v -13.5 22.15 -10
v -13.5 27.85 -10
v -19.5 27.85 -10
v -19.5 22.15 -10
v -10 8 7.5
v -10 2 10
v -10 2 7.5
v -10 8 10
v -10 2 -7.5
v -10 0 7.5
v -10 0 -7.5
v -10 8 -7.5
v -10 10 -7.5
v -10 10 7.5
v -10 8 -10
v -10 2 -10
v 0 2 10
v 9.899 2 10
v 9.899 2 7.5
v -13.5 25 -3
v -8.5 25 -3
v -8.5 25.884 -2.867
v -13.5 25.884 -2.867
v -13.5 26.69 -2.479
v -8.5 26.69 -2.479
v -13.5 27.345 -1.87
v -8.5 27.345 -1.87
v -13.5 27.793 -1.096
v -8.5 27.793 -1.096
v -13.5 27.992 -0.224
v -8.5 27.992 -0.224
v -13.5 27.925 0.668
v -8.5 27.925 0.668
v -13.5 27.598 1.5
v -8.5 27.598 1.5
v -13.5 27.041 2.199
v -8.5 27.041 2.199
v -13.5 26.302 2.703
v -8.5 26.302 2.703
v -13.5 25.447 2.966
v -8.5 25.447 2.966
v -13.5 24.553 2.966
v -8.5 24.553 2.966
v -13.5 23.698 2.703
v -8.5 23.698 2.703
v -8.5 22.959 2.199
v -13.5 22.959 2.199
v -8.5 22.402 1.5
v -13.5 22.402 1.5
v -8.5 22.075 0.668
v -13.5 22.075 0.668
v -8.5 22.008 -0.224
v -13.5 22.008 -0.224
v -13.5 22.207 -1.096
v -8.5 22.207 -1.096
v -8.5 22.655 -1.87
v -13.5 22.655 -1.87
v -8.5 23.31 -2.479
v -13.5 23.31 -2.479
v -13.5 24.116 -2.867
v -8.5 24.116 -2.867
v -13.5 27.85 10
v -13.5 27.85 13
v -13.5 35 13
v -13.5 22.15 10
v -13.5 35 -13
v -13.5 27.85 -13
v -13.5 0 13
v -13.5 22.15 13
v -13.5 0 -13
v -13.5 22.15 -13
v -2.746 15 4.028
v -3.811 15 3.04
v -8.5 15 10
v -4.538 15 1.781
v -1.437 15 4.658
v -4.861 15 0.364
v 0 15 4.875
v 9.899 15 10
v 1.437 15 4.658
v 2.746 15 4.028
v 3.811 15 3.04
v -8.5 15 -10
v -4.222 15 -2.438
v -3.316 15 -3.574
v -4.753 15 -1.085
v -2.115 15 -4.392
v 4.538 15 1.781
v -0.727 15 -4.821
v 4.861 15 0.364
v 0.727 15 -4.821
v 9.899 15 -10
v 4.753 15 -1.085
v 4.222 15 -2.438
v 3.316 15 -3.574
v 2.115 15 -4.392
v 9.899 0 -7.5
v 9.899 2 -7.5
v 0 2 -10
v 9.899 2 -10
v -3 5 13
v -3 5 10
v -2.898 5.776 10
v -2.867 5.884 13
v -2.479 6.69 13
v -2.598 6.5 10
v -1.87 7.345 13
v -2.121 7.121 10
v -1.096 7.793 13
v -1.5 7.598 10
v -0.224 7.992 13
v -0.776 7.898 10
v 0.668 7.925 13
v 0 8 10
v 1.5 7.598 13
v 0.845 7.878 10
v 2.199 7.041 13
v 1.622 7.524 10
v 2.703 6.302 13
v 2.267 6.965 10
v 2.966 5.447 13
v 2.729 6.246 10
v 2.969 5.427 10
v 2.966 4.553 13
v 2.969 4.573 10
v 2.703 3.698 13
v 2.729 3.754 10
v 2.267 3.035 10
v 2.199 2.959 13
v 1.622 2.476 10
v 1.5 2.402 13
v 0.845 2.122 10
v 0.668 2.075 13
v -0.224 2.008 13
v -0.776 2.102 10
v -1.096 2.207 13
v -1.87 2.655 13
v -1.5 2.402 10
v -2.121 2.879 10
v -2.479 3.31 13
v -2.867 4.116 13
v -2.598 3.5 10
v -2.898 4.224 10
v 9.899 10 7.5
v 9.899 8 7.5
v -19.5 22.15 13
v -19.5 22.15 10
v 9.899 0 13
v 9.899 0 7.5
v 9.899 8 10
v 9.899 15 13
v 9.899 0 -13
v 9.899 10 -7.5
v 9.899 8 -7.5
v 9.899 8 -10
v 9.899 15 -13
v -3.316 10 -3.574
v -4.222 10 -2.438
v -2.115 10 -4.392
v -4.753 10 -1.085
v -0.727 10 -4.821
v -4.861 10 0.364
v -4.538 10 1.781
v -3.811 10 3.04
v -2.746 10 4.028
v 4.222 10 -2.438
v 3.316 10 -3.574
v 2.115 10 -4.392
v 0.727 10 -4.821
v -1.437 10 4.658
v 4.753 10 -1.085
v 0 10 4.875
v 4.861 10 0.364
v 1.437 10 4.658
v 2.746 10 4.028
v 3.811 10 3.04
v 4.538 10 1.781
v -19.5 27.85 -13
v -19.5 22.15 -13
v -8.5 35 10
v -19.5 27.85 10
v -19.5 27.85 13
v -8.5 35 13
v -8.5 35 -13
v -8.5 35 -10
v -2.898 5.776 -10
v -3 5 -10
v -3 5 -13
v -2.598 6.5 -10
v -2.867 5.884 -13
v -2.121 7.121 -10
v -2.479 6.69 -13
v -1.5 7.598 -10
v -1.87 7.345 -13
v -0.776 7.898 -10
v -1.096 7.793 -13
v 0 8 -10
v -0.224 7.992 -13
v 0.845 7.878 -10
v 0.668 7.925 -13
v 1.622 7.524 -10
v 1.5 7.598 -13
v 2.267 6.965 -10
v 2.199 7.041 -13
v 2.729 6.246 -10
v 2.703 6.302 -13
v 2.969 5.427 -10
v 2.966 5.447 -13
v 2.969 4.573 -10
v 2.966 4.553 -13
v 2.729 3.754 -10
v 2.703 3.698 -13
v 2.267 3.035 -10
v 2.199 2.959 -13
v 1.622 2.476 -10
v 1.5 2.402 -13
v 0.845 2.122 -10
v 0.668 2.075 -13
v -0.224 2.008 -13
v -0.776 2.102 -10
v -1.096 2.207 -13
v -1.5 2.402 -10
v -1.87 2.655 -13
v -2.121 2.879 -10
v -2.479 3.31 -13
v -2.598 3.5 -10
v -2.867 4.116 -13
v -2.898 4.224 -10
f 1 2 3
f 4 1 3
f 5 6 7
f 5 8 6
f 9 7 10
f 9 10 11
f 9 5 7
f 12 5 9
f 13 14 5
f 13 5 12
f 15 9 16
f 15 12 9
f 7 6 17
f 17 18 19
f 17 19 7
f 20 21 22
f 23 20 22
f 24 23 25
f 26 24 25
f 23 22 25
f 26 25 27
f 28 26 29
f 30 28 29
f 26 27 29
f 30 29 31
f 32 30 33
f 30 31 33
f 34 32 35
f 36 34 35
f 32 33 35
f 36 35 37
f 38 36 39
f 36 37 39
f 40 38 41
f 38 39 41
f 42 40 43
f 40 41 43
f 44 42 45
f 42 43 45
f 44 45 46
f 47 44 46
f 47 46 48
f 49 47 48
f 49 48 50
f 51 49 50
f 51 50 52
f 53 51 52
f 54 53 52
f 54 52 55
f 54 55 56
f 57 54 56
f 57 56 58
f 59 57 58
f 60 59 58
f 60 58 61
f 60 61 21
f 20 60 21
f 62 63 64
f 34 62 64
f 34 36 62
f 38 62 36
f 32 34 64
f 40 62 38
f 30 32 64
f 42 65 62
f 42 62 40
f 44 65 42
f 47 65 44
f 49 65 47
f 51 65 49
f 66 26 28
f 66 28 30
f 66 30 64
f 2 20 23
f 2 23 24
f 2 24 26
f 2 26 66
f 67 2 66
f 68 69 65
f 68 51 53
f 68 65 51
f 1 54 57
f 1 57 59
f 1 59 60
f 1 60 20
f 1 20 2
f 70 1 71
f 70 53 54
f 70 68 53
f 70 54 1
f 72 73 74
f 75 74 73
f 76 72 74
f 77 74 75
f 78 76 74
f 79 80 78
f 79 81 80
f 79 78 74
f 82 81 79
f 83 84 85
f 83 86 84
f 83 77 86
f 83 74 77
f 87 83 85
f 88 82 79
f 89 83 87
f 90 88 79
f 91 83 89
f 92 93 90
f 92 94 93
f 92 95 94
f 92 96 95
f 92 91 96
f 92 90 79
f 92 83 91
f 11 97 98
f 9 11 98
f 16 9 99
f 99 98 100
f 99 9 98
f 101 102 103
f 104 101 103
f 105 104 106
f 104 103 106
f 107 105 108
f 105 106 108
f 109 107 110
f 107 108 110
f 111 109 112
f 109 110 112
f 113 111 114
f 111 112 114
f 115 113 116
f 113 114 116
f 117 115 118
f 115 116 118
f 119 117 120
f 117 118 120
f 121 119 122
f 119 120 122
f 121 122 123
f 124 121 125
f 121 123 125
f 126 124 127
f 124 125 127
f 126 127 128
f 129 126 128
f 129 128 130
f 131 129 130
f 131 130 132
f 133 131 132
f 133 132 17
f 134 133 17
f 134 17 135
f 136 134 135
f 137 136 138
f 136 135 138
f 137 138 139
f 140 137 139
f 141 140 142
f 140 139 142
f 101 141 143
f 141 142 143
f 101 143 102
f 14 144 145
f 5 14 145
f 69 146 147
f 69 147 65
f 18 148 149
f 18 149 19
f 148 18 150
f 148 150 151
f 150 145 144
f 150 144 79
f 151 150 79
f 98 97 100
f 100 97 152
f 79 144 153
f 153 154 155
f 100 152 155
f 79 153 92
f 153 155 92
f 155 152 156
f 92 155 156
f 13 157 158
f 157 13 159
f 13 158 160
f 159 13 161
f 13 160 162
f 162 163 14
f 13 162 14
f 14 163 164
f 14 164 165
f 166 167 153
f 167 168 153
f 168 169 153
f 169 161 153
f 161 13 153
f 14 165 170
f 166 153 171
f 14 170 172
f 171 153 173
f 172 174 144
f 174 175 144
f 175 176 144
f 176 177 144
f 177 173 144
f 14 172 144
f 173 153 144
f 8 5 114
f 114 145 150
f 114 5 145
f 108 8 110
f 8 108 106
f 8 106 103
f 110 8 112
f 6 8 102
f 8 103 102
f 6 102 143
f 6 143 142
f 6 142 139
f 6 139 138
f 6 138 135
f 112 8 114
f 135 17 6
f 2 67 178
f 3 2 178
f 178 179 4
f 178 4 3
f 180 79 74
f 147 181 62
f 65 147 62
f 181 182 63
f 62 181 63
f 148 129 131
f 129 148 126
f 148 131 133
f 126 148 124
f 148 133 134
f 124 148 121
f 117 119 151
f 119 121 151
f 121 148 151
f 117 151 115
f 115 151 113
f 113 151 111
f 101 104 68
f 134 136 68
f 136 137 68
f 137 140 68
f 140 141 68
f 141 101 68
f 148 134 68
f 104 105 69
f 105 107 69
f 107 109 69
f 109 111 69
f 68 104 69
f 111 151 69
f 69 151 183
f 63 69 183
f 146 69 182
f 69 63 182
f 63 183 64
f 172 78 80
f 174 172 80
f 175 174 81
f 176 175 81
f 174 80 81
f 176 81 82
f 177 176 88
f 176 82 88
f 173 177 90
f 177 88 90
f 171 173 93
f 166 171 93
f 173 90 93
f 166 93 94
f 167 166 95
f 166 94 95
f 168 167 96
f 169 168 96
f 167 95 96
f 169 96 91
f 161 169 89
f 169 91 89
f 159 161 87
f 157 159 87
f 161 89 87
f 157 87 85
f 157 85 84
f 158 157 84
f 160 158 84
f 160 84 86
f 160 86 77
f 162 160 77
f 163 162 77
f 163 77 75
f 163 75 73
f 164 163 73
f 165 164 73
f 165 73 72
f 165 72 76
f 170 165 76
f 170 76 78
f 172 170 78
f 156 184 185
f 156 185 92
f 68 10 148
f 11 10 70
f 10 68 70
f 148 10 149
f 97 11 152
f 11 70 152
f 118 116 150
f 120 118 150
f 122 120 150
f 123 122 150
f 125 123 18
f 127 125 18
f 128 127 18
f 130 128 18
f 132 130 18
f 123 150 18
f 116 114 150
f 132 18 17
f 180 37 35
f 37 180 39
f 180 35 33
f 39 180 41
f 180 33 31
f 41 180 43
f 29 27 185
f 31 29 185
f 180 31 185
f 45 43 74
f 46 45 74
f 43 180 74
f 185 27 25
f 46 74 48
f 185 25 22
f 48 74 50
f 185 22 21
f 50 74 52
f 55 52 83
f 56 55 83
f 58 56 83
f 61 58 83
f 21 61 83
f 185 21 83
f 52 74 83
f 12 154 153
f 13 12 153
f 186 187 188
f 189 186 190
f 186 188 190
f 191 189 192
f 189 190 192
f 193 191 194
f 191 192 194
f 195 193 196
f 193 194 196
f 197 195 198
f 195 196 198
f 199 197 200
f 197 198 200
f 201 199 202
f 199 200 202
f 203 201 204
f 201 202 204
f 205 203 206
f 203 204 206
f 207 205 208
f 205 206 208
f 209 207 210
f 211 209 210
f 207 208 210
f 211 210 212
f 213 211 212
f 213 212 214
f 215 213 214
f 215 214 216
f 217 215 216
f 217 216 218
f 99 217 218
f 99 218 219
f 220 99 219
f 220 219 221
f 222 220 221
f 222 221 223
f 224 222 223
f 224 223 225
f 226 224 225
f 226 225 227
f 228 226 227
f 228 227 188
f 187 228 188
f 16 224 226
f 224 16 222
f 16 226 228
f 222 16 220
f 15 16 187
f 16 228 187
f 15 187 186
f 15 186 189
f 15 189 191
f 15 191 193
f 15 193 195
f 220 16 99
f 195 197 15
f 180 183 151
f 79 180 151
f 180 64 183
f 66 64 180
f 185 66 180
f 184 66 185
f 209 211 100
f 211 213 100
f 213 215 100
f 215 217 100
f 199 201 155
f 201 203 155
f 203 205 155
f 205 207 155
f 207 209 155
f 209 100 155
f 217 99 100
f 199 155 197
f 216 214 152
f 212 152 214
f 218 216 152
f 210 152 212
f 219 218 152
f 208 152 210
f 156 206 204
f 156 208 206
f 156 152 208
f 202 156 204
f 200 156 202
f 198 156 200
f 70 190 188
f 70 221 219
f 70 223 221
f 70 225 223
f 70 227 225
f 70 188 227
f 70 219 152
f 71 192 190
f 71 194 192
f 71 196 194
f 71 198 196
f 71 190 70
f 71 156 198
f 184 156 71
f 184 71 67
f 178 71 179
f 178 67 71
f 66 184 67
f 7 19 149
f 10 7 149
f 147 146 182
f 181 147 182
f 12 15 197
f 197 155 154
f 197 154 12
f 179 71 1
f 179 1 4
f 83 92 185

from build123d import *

# Parameters (mm, degrees)
SKETCH1_W           = 27
SKETCH1_H           = 26
BOSS_EXTRUDE1_DEPTH = 15
CUT_EXTRUDE2_DEPTH  = 23.5
SKETCH5_W           = 3.601284645
SKETCH5_H           = 15
CUT_EXTRUDE3_DEPTH  = 33.912763482
SKETCH6_R           = 3
CUT_EXTRUDE4_DEPTH  = 33.912763482
SKETCH7_W           = 5
SKETCH7_H           = 26
BOSS_EXTRUDE2_DEPTH = 20
SKETCH8_W           = 6
SKETCH8_H           = 5.7
BOSS_EXTRUDE3_DEPTH = 3
SKETCH9_W           = 6
SKETCH9_H           = 5.7
BOSS_EXTRUDE4_DEPTH = 3
SKETCH10_R          = 3
CUT_EXTRUDE5_DEPTH  = 42.623463656
SKETCH11_R          = 4.875
CUT_EXTRUDE6_DEPTH  = 31.809901006


with BuildPart() as part:
    # Sketch1 → Boss-Extrude1 (new body)
    with BuildSketch(Plane(origin=(0, 0, 0), x_dir=(1, 0, 0), z_dir=(0, 1, 0))):
        Rectangle(SKETCH1_W, SKETCH1_H)
    extrude(amount=BOSS_EXTRUDE1_DEPTH)

    # Sketch4 → Cut-Extrude2 (cut)
    with BuildSketch(Plane(origin=(13.5, 0, 0), x_dir=(0, 0, -1), z_dir=(1, 0, 0))):
        Polygon((-10, 2), (-7.5, 2), (-7.5, 0), (7.5, 0), (7.5, 2), (10, 2), (10, 8), (7.5, 8), (7.5, 10), (-7.5, 10), (-7.5, 8), (-10, 8), align=None)
    extrude(amount=-CUT_EXTRUDE2_DEPTH, mode=Mode.SUBTRACT)

    # Sketch5 → Cut-Extrude3 (cut, through all)
    with BuildSketch(Plane(origin=(0, 0, -13), x_dir=(-1, 0, 0), z_dir=(0, 0, -1))):
        with Locations((-11.699357678, 7.5)):
            Rectangle(SKETCH5_W, SKETCH5_H)
    extrude(amount=-CUT_EXTRUDE3_DEPTH, mode=Mode.SUBTRACT)

    # Sketch6 → Cut-Extrude4 (cut, through all)
    with BuildSketch(Plane(origin=(0, 0, -13), x_dir=(-1, 0, 0), z_dir=(0, 0, -1))):
        with Locations((0, 5)):
            Circle(SKETCH6_R)
    extrude(amount=-CUT_EXTRUDE4_DEPTH, mode=Mode.SUBTRACT)

    # Sketch7 → Boss-Extrude2 (add)
    with BuildSketch(Plane(origin=(0, 15, 0), x_dir=(1, 0, 0), z_dir=(0, 1, 0))):
        with Locations((-11, 0)):
            Rectangle(SKETCH7_W, SKETCH7_H)
    extrude(amount=BOSS_EXTRUDE2_DEPTH)

    # Sketch8 → Boss-Extrude3 (add)
    with BuildSketch(Plane(origin=(0, 0, -13), x_dir=(-1, 0, 0), z_dir=(0, 0, -1))):
        Polygon((8.5, 35), (-9.898715355, 15), (8.5, 15), align=None)
        with Locations((16.5, 25)):
            Rectangle(SKETCH8_W, SKETCH8_H)
    extrude(amount=-BOSS_EXTRUDE3_DEPTH)

    # Sketch9 → Boss-Extrude4 (add)
    with BuildSketch(Plane.XY.offset(13)):
        Polygon((-8.5, 35), (9.898715355, 15), (-8.5, 15), align=None)
        with Locations((-16.5, 25)):
            Rectangle(SKETCH9_W, SKETCH9_H)
    extrude(amount=-BOSS_EXTRUDE4_DEPTH)

    # Sketch10 → Cut-Extrude5 (cut, through all)
    with BuildSketch(Plane(origin=(-8.5, 0, 0), x_dir=(0, 0, -1), z_dir=(1, 0, 0))):
        with Locations((0, 25)):
            Circle(SKETCH10_R)
    extrude(amount=-CUT_EXTRUDE5_DEPTH, mode=Mode.SUBTRACT)

    # Sketch11 → Cut-Extrude6 (cut, through all)
    with BuildSketch(Plane(origin=(0, 15, 0), x_dir=(1, 0, 0), z_dir=(0, 1, 0))):
        with Locations(Location((0, 0, 0), (0, 0, 270))):
            Circle(SKETCH11_R)
    extrude(amount=-CUT_EXTRUDE6_DEPTH, mode=Mode.SUBTRACT)


solid = part.part
